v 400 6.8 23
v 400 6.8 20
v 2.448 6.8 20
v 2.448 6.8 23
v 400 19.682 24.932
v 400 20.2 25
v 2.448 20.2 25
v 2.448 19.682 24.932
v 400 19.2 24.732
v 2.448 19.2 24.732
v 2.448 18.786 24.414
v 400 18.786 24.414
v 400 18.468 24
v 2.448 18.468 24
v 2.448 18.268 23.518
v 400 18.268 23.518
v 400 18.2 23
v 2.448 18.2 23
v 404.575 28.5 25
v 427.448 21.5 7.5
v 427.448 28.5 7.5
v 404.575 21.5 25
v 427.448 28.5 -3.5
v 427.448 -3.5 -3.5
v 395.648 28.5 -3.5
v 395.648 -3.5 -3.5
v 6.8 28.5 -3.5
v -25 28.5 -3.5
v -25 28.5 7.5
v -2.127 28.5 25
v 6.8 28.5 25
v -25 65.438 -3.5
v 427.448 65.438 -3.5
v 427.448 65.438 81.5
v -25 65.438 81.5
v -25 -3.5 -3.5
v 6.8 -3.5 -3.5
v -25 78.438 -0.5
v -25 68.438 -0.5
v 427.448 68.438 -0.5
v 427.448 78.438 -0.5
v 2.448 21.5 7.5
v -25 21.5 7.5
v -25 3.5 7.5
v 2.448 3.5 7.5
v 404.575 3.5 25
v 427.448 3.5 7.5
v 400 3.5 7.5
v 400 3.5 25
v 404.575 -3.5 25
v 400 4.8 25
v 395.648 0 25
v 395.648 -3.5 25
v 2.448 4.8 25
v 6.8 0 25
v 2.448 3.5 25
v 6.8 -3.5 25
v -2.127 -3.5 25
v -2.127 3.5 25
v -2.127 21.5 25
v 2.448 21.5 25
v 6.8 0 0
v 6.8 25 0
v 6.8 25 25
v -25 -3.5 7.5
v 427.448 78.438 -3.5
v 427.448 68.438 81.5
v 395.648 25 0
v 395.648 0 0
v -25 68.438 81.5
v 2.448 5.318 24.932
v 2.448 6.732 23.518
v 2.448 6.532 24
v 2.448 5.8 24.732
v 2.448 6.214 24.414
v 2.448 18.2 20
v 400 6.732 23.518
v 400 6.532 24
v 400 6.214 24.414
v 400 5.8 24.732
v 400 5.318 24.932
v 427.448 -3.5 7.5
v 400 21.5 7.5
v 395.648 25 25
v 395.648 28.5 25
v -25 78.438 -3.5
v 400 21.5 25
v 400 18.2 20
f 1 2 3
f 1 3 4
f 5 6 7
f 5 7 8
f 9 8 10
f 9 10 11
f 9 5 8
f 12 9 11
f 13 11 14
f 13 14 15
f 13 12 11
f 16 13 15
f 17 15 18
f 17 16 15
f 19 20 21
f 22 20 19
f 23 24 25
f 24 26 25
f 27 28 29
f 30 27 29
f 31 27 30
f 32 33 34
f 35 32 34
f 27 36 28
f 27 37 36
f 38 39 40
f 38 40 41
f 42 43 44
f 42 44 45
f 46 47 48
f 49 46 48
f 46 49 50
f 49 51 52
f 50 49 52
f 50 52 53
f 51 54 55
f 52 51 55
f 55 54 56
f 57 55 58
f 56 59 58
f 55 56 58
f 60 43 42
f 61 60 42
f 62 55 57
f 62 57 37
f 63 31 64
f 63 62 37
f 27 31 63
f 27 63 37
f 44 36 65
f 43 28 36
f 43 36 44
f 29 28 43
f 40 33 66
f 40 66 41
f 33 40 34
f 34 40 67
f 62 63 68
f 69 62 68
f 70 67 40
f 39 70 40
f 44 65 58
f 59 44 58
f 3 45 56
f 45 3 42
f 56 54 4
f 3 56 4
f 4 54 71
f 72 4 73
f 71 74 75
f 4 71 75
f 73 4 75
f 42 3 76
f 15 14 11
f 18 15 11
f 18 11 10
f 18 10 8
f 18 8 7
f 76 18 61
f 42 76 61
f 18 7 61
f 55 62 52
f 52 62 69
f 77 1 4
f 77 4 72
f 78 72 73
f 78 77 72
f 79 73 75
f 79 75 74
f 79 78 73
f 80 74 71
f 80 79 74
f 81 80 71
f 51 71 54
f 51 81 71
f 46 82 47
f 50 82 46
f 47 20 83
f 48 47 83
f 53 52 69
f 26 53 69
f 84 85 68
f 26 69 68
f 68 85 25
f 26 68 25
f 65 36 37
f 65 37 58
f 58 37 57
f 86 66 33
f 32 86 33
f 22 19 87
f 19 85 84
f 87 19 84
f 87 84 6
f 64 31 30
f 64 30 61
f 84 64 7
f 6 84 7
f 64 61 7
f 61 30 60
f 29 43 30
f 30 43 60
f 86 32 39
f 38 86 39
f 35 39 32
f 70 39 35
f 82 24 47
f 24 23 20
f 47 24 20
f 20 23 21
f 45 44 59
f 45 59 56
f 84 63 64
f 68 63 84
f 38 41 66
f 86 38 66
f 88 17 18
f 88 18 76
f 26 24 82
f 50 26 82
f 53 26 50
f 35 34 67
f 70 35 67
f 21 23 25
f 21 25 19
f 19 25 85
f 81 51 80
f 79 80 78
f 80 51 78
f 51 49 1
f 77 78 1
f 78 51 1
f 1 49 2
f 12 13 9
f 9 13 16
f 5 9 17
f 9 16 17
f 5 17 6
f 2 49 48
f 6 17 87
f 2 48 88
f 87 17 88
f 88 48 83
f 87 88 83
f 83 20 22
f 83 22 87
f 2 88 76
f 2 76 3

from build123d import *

# Parameters (mm, degrees)
SKETCH1_W               = 400
SKETCH1_H               = 25
BOSS_EXTRUDE1_DEPTH     = 25
SKETCH2_W               = 386.4
SKETCH2_H               = 11.4
CUT_EXTRUDE2_DEPTH      = 5
SKETCH4_W               = 32
SKETCH4_H               = 32
SKETCH4_W_2             = 25
SKETCH4_H_2             = 25
BOSS_EXTRUDE2_DEPTH     = 6.8
SKETCH5_W               = 32
SKETCH5_H               = 32
BOSS_EXTRUDE3_DEPTH     = 25
SKETCH6_W               = 27.448100552
SKETCH6_H               = 18
CUT_EXTRUDE3_DEPTH      = 21
CUT_EXTRUDE4_DEPTH      = 43
CUT_EXTRUDE5_DEPTH      = 43
CUT_EXTRUDE5_DEPTH_BACK = 413
BOSS_EXTRUDE4_DEPTH     = 452.448100552


with BuildPart() as part:
    # Sketch1 → Boss-Extrude1 (new body)
    with BuildSketch(Plane.XY):
        with Locations((200, 12.5)):
            Rectangle(SKETCH1_W, SKETCH1_H)
    extrude(amount=BOSS_EXTRUDE1_DEPTH)

    # Sketch2 → Cut-Extrude2 (cut)
    with BuildSketch(Plane.XY.offset(25)):
        with Locations((200, 12.5)):
            Rectangle(SKETCH2_W, SKETCH2_H)
    extrude(amount=-CUT_EXTRUDE2_DEPTH, mode=Mode.SUBTRACT)



with BuildPart() as body_2:
    # Sketch4 → Boss-Extrude2 (new body)
    with BuildSketch(Plane(origin=(6.8, 0, 0), x_dir=(0, 0, -1), z_dir=(1, 0, 0))):
        with Locations((-12.5, 12.5)):
            Rectangle(SKETCH4_W, SKETCH4_H)
        with Locations((-12.5, 12.5)):
            Rectangle(SKETCH4_W_2, SKETCH4_H_2, mode=Mode.SUBTRACT)
    extrude(amount=-BOSS_EXTRUDE2_DEPTH)


with BuildPart() as part_1:
    add(part.part)

    add(body_2.part)  # Boss-Extrude3 merges body 2
    # Sketch5 → Boss-Extrude3 (add)
    with BuildSketch(Plane.ZY):
        with Locations((12.5, 12.5)):
            Rectangle(SKETCH5_W, SKETCH5_H)
    extrude(amount=BOSS_EXTRUDE3_DEPTH)

    # Sketch6 → Cut-Extrude3 (cut)
    with BuildSketch(Plane.XY.offset(28.5)):
        with Locations((-11.275949724, 12.5)):
            Rectangle(SKETCH6_W, SKETCH6_H)
    extrude(amount=-CUT_EXTRUDE3_DEPTH, mode=Mode.SUBTRACT)

    # Sketch7 → Cut-Extrude4 (cut)
    with BuildSketch(Plane.XZ.offset(3.5)):
        Polygon((2.448100552, 28.5), (-25, 28.5), (-25, 7.5), align=None)
    extrude(amount=-CUT_EXTRUDE4_DEPTH, mode=Mode.SUBTRACT)

    # Sketch8 → Cut-Extrude5 (cut, two sides: drawn at the far end of the back side and taken through both)
    with BuildSketch(Plane.ZY.offset(-2.448100552).offset(-CUT_EXTRUDE5_DEPTH_BACK)):
        with BuildLine():
            Line((20, 6.8), (23, 6.8))
            ThreePointArc((23, 6.8), (24.414213562, 6.214213562), (25, 4.8))
            Line((25, 4.8), (25, -5.020840196))
            Line((25, -5.020840196), (31.991589763, -5.020840196))
            Line((31.991589763, -5.020840196), (31.991589763, 30.746420452))
            Line((31.991589763, 30.746420452), (25, 30.746420452))
            Line((25, 30.746420452), (25, 20.2))
            ThreePointArc((25, 20.2), (24.414213562, 18.785786438), (23, 18.2))
            Line((23, 18.2), (20, 18.2))
            Line((20, 18.2), (20, 6.8))
        make_face()
    extrude(amount=CUT_EXTRUDE5_DEPTH + CUT_EXTRUDE5_DEPTH_BACK, mode=Mode.SUBTRACT)

    # Mirror6: part across plane


with BuildPart() as part_2:
    add(part_1.part)
    add(part_1.part.mirror(Plane(origin=(201.224050276, 0, 0), x_dir=(0, 0, 1), z_dir=(1, 0, 0))))


with BuildPart() as body_2_2:
    # Sketch9 → Boss-Extrude4 (new body)
    with BuildSketch(Plane(origin=(427.448100552, 0, 0), x_dir=(0, 0, -1), z_dir=(1, 0, 0))):
        Polygon((3.5, 78.438077684), (3.5, 65.438077684), (-81.5, 65.438077684), (-81.5, 68.438077684), (0.5, 68.438077684), (0.5, 78.438077684), align=None)
    extrude(amount=-BOSS_EXTRUDE4_DEPTH)


solid = Compound([part_2.part, body_2_2.part])
